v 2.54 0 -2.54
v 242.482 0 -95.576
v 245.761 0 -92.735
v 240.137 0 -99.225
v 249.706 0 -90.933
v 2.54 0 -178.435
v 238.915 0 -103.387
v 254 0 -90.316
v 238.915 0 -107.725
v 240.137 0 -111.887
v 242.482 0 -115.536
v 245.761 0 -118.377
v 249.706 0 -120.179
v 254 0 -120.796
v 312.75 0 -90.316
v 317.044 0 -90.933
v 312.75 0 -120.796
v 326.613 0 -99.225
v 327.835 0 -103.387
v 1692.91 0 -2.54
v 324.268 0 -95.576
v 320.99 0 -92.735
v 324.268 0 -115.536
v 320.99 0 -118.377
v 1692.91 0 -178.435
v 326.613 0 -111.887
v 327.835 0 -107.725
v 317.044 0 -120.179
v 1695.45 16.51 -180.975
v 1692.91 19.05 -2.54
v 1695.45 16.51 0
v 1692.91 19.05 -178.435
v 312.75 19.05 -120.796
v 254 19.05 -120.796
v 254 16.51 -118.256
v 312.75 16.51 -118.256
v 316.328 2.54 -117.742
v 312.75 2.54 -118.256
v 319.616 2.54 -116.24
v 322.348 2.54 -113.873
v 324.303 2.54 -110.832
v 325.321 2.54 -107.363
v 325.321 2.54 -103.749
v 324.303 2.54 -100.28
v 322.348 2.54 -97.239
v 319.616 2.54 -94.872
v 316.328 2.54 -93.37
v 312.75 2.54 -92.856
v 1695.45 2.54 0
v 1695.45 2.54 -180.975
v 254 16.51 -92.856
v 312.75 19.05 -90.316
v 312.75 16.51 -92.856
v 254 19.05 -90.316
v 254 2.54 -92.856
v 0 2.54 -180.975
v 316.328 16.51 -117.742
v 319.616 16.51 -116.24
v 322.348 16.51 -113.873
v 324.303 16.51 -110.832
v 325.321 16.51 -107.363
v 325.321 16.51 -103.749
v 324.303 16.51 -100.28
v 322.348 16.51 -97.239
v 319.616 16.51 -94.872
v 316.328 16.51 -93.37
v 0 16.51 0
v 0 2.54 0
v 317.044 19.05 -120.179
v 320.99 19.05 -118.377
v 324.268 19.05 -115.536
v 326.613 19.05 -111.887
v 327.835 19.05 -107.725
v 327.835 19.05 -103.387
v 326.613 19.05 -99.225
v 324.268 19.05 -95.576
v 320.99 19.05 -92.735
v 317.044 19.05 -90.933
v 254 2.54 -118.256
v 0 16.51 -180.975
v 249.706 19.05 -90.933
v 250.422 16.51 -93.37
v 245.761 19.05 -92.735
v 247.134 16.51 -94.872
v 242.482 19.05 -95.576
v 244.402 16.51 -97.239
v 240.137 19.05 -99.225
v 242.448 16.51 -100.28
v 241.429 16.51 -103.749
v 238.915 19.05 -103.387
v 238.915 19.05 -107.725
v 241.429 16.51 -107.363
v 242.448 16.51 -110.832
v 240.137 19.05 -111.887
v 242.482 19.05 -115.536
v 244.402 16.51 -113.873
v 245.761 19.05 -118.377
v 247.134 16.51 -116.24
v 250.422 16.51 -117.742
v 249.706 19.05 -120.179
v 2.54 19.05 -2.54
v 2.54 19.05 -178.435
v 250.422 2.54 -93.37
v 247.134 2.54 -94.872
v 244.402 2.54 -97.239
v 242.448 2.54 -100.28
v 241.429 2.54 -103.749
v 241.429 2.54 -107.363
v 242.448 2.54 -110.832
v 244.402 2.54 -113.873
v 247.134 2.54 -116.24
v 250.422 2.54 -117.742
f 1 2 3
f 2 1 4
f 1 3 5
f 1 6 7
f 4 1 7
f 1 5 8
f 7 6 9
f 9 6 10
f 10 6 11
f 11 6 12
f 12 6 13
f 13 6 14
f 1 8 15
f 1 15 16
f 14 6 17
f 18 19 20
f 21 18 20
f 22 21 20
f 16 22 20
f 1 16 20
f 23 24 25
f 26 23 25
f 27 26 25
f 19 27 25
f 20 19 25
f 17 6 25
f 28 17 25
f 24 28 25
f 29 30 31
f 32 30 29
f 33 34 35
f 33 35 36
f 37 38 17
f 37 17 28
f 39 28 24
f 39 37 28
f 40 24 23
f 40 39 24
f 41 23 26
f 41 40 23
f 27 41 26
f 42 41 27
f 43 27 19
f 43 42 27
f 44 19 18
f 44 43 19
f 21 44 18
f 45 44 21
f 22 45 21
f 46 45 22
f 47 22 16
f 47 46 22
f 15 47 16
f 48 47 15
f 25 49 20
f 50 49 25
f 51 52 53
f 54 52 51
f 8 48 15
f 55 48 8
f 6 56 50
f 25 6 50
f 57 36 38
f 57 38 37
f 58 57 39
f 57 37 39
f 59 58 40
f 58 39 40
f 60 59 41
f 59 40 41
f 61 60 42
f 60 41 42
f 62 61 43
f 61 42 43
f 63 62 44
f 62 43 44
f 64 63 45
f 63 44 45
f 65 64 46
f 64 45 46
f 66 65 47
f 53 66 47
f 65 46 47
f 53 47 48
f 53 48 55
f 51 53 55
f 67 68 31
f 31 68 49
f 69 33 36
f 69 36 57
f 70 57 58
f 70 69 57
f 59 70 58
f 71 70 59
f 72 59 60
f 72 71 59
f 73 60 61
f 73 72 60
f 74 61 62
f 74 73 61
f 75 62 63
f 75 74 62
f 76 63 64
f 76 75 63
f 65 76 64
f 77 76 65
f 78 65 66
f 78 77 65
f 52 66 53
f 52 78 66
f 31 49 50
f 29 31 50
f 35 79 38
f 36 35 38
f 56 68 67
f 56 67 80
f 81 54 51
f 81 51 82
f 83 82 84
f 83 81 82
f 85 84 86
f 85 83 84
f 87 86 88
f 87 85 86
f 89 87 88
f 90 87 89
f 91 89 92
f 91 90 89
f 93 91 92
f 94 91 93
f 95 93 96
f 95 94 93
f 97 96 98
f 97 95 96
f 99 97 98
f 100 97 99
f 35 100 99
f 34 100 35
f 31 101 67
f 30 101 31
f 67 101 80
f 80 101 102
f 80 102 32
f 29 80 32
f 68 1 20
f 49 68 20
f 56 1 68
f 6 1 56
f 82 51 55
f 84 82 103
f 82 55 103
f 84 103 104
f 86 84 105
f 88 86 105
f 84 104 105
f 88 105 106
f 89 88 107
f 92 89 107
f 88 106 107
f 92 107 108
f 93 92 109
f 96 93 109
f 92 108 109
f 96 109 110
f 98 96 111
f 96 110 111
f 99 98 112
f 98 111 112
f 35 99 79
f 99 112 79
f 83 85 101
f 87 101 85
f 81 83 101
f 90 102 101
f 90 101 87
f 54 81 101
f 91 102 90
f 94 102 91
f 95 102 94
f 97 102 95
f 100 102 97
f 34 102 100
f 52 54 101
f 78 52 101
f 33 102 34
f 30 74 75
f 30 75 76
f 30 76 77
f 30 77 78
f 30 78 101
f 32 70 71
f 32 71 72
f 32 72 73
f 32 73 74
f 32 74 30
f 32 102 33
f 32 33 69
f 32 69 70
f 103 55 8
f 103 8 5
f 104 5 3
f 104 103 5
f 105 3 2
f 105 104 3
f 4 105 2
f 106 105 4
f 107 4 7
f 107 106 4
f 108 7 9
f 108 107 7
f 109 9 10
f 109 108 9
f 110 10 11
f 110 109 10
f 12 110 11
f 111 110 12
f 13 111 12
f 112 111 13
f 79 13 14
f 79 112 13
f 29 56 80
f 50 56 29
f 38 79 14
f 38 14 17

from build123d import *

# Parameters (mm, degrees)
SKETCH1_W           = 1695.45
SKETCH1_H           = 180.975
BOSS_EXTRUDE1_DEPTH = 19.05
CHAMFER1_SIZE       = 2.54
CHAMFER2_SIZE       = 2.54


with BuildPart() as part:
    # Sketch1 → Boss-Extrude1 (new body)
    with BuildSketch(Plane(origin=(0, 0, 0), x_dir=(1, 0, 0), z_dir=(0, 1, 0))):
        with Locations((847.725, 90.4875)):
            Rectangle(SKETCH1_W, SKETCH1_H)
        with BuildLine():
            Line((254, 118.25605), (312.7502, 118.25605))
            ThreePointArc((312.7502, 118.25605), (325.4502, 105.55605), (312.7502, 92.85605))
            Line((312.7502, 92.85605), (254, 92.85605))
            ThreePointArc((254, 92.85605), (241.3, 105.55605), (254, 118.25605))
        make_face(mode=Mode.SUBTRACT)
    extrude(amount=BOSS_EXTRUDE1_DEPTH)

    # Chamfer1
    chamfer1_edges = [part.edges().sort_by_distance(p)[0] for p in [
        (1695.45, 19.05, -90.4875),
        (325.4502, 19.05, -105.55605),
        (847.725, 19.05, -180.975),
        (283.3751, 19.05, -118.25605),
        (241.3, 19.05, -105.55605),
        (283.3751, 19.05, -92.85605),
        (0, 19.05, -90.4875),
        (847.725, 19.05, 0),
    ]]
    chamfer(chamfer1_edges, length=CHAMFER1_SIZE)

    # Chamfer2
    chamfer2_edges = [part.edges().sort_by_distance(p)[0] for p in [
        (325.4502, 0, -105.55605),
        (283.3751, 0, -118.25605),
        (241.3, 0, -105.55605),
        (283.3751, 0, -92.85605),
        (847.725, 0, -180.975),
        (1695.45, 0, -90.4875),
        (847.725, 0, 0),
        (0, 0, -90.4875),
    ]]
    chamfer(chamfer2_edges, length=CHAMFER2_SIZE)


solid = part.part
